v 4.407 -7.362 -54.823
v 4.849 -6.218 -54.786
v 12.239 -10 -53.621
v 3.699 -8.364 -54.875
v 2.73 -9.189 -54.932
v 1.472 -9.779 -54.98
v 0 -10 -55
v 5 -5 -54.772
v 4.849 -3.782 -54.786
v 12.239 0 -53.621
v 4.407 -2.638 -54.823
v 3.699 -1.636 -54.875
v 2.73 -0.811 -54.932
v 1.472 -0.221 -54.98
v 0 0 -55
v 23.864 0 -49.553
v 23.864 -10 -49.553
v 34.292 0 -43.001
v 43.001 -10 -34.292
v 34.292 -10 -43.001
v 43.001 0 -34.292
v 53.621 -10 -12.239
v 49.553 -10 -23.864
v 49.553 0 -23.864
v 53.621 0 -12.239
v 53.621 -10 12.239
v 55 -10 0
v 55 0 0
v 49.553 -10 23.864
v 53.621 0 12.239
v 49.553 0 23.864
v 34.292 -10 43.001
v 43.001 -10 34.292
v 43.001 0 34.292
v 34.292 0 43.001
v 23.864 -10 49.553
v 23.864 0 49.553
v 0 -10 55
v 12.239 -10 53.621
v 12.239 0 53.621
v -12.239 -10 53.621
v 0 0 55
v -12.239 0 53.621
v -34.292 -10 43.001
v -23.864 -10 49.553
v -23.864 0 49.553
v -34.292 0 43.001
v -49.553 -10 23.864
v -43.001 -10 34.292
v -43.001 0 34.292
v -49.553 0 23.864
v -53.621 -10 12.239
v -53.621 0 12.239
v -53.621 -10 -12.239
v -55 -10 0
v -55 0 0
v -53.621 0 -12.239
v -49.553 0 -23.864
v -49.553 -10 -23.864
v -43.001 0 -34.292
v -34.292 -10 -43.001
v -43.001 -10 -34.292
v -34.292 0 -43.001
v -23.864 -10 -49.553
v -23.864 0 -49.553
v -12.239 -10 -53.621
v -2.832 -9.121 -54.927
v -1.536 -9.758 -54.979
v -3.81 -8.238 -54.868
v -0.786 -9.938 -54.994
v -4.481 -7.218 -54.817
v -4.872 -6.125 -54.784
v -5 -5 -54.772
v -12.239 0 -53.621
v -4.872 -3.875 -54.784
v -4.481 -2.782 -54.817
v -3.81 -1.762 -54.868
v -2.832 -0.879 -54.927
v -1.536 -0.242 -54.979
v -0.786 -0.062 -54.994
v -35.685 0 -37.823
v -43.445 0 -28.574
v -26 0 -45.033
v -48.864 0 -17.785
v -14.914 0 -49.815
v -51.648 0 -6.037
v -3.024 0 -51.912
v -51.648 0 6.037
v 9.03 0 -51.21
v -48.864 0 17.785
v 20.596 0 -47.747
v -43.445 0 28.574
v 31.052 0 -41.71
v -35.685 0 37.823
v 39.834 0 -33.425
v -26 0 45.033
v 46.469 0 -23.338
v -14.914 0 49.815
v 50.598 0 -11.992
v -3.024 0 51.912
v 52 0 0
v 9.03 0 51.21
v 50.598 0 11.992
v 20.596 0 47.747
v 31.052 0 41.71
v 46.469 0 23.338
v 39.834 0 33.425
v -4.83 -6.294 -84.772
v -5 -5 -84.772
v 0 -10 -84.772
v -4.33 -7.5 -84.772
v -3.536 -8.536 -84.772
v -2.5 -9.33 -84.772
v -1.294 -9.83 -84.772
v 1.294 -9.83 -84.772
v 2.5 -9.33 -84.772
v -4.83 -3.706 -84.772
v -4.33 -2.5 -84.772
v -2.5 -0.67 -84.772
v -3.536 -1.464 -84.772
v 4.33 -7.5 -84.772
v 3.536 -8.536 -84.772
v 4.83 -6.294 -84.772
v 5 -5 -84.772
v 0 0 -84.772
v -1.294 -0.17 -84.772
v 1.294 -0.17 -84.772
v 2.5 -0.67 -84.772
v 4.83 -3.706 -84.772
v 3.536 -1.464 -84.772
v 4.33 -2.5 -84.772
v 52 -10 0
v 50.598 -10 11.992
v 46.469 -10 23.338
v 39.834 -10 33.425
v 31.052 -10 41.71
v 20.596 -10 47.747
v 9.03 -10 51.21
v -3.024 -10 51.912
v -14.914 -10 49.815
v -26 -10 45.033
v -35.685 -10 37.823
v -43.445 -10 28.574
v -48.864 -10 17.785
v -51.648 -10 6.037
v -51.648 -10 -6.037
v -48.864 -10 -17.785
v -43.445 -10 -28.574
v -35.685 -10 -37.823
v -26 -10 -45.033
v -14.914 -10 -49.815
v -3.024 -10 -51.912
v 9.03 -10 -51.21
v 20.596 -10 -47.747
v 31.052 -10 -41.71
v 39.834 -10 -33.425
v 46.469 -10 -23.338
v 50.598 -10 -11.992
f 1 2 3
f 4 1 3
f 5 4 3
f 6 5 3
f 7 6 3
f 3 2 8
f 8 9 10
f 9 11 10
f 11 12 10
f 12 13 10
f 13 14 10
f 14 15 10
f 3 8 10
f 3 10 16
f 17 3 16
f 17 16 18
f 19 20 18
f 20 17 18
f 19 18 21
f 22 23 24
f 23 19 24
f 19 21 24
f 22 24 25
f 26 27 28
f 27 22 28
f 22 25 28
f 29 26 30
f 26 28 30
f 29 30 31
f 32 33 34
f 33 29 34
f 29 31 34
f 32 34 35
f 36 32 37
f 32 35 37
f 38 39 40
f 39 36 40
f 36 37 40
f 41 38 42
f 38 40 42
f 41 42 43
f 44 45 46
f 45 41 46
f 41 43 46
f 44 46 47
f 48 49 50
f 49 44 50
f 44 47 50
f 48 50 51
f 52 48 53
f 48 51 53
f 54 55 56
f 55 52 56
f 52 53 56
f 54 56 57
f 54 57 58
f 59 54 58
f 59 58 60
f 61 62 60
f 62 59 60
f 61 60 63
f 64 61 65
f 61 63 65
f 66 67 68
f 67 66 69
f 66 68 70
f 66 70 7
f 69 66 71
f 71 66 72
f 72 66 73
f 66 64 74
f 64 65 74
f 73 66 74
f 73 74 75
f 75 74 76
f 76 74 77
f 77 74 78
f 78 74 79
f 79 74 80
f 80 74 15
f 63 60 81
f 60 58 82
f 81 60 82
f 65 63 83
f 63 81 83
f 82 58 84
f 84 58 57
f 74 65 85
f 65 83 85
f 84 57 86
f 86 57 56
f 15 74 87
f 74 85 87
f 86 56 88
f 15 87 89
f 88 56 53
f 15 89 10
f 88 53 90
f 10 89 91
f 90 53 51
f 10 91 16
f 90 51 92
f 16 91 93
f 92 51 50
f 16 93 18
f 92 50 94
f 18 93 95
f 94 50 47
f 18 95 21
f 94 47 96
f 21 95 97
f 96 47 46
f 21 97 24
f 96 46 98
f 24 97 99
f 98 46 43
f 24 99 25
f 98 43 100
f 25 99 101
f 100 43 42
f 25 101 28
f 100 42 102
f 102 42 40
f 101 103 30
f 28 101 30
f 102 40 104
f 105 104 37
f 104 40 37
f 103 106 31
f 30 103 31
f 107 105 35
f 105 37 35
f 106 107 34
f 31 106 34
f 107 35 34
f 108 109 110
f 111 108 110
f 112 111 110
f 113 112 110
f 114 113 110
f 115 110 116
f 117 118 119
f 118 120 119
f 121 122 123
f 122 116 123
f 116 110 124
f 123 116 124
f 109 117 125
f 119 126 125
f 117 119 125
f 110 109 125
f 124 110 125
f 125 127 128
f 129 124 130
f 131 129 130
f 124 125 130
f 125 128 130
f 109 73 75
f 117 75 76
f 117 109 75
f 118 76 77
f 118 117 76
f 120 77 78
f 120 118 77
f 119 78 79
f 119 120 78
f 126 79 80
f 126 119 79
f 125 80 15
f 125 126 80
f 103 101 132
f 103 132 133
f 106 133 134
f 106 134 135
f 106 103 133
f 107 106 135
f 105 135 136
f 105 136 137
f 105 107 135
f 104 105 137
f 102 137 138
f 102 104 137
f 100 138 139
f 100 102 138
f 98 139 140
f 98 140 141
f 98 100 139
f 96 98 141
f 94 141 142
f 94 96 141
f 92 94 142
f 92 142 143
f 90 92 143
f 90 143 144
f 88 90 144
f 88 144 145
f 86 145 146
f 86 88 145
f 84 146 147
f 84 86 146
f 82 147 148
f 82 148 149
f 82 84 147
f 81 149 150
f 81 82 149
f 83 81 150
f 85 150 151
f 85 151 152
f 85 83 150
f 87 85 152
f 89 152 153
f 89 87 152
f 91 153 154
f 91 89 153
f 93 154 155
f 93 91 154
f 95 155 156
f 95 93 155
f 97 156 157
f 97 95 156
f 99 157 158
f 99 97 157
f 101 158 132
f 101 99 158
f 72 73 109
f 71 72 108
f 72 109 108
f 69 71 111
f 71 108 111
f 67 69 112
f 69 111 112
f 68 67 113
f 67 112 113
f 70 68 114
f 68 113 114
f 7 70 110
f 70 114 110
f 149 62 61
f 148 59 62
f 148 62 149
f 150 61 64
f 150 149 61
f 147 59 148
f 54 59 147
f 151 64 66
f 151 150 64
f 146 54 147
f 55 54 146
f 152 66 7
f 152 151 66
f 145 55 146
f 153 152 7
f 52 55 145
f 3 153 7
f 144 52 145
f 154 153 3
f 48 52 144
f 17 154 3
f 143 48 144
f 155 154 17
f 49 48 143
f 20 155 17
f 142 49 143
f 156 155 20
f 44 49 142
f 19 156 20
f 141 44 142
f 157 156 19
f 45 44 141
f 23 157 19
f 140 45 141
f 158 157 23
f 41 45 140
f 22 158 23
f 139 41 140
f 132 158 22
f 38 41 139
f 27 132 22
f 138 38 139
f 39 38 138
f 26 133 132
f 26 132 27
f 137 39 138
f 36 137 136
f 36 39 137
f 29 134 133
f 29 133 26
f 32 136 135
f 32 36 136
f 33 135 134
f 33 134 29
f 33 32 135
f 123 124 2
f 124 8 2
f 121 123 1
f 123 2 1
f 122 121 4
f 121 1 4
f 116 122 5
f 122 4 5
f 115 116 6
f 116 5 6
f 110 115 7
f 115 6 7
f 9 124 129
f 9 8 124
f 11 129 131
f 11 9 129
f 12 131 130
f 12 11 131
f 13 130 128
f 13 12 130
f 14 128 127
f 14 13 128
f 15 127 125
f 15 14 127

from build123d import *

# Parameters (mm, degrees)
F0_R     = 52
F1_DEPTH = 10
F2_R     = 4.99999


# Not quite as in the source:
# - a fillet or chamfer is up to 0.001 mm smaller than in the source, because OpenCascade refuses the exact size


with BuildPart() as f1:
    # F0 (on Front) → F1 (new body)
    with BuildSketch(Plane.XZ):
        with BuildLine():
            Line((5, -84.7722557505), (5, -54.7722557505))
            ThreePointArc((5, -54.7722557505), (0, 55), (-5, -54.7722557505))
            Line((-5, -54.7722557505), (-5, -84.7722557505))
            Line((-5, -84.7722557505), (5, -84.7722557505))
        make_face()
        Circle(F0_R, mode=Mode.SUBTRACT)
    extrude(amount=F1_DEPTH)

    # F2 (radius 5 in the source; OpenCascade refuses exactly that, so slightly less here)
    f2_edges = [f1.edges().sort_by_distance(p)[0] for p in [
        (5, -10, -69.772256),
        (-5, -10, -69.772256),
        (-5, 0, -69.772256),
        (5, 0, -69.772256),
    ]]
    fillet(f2_edges, radius=F2_R)


solid = f1.part
